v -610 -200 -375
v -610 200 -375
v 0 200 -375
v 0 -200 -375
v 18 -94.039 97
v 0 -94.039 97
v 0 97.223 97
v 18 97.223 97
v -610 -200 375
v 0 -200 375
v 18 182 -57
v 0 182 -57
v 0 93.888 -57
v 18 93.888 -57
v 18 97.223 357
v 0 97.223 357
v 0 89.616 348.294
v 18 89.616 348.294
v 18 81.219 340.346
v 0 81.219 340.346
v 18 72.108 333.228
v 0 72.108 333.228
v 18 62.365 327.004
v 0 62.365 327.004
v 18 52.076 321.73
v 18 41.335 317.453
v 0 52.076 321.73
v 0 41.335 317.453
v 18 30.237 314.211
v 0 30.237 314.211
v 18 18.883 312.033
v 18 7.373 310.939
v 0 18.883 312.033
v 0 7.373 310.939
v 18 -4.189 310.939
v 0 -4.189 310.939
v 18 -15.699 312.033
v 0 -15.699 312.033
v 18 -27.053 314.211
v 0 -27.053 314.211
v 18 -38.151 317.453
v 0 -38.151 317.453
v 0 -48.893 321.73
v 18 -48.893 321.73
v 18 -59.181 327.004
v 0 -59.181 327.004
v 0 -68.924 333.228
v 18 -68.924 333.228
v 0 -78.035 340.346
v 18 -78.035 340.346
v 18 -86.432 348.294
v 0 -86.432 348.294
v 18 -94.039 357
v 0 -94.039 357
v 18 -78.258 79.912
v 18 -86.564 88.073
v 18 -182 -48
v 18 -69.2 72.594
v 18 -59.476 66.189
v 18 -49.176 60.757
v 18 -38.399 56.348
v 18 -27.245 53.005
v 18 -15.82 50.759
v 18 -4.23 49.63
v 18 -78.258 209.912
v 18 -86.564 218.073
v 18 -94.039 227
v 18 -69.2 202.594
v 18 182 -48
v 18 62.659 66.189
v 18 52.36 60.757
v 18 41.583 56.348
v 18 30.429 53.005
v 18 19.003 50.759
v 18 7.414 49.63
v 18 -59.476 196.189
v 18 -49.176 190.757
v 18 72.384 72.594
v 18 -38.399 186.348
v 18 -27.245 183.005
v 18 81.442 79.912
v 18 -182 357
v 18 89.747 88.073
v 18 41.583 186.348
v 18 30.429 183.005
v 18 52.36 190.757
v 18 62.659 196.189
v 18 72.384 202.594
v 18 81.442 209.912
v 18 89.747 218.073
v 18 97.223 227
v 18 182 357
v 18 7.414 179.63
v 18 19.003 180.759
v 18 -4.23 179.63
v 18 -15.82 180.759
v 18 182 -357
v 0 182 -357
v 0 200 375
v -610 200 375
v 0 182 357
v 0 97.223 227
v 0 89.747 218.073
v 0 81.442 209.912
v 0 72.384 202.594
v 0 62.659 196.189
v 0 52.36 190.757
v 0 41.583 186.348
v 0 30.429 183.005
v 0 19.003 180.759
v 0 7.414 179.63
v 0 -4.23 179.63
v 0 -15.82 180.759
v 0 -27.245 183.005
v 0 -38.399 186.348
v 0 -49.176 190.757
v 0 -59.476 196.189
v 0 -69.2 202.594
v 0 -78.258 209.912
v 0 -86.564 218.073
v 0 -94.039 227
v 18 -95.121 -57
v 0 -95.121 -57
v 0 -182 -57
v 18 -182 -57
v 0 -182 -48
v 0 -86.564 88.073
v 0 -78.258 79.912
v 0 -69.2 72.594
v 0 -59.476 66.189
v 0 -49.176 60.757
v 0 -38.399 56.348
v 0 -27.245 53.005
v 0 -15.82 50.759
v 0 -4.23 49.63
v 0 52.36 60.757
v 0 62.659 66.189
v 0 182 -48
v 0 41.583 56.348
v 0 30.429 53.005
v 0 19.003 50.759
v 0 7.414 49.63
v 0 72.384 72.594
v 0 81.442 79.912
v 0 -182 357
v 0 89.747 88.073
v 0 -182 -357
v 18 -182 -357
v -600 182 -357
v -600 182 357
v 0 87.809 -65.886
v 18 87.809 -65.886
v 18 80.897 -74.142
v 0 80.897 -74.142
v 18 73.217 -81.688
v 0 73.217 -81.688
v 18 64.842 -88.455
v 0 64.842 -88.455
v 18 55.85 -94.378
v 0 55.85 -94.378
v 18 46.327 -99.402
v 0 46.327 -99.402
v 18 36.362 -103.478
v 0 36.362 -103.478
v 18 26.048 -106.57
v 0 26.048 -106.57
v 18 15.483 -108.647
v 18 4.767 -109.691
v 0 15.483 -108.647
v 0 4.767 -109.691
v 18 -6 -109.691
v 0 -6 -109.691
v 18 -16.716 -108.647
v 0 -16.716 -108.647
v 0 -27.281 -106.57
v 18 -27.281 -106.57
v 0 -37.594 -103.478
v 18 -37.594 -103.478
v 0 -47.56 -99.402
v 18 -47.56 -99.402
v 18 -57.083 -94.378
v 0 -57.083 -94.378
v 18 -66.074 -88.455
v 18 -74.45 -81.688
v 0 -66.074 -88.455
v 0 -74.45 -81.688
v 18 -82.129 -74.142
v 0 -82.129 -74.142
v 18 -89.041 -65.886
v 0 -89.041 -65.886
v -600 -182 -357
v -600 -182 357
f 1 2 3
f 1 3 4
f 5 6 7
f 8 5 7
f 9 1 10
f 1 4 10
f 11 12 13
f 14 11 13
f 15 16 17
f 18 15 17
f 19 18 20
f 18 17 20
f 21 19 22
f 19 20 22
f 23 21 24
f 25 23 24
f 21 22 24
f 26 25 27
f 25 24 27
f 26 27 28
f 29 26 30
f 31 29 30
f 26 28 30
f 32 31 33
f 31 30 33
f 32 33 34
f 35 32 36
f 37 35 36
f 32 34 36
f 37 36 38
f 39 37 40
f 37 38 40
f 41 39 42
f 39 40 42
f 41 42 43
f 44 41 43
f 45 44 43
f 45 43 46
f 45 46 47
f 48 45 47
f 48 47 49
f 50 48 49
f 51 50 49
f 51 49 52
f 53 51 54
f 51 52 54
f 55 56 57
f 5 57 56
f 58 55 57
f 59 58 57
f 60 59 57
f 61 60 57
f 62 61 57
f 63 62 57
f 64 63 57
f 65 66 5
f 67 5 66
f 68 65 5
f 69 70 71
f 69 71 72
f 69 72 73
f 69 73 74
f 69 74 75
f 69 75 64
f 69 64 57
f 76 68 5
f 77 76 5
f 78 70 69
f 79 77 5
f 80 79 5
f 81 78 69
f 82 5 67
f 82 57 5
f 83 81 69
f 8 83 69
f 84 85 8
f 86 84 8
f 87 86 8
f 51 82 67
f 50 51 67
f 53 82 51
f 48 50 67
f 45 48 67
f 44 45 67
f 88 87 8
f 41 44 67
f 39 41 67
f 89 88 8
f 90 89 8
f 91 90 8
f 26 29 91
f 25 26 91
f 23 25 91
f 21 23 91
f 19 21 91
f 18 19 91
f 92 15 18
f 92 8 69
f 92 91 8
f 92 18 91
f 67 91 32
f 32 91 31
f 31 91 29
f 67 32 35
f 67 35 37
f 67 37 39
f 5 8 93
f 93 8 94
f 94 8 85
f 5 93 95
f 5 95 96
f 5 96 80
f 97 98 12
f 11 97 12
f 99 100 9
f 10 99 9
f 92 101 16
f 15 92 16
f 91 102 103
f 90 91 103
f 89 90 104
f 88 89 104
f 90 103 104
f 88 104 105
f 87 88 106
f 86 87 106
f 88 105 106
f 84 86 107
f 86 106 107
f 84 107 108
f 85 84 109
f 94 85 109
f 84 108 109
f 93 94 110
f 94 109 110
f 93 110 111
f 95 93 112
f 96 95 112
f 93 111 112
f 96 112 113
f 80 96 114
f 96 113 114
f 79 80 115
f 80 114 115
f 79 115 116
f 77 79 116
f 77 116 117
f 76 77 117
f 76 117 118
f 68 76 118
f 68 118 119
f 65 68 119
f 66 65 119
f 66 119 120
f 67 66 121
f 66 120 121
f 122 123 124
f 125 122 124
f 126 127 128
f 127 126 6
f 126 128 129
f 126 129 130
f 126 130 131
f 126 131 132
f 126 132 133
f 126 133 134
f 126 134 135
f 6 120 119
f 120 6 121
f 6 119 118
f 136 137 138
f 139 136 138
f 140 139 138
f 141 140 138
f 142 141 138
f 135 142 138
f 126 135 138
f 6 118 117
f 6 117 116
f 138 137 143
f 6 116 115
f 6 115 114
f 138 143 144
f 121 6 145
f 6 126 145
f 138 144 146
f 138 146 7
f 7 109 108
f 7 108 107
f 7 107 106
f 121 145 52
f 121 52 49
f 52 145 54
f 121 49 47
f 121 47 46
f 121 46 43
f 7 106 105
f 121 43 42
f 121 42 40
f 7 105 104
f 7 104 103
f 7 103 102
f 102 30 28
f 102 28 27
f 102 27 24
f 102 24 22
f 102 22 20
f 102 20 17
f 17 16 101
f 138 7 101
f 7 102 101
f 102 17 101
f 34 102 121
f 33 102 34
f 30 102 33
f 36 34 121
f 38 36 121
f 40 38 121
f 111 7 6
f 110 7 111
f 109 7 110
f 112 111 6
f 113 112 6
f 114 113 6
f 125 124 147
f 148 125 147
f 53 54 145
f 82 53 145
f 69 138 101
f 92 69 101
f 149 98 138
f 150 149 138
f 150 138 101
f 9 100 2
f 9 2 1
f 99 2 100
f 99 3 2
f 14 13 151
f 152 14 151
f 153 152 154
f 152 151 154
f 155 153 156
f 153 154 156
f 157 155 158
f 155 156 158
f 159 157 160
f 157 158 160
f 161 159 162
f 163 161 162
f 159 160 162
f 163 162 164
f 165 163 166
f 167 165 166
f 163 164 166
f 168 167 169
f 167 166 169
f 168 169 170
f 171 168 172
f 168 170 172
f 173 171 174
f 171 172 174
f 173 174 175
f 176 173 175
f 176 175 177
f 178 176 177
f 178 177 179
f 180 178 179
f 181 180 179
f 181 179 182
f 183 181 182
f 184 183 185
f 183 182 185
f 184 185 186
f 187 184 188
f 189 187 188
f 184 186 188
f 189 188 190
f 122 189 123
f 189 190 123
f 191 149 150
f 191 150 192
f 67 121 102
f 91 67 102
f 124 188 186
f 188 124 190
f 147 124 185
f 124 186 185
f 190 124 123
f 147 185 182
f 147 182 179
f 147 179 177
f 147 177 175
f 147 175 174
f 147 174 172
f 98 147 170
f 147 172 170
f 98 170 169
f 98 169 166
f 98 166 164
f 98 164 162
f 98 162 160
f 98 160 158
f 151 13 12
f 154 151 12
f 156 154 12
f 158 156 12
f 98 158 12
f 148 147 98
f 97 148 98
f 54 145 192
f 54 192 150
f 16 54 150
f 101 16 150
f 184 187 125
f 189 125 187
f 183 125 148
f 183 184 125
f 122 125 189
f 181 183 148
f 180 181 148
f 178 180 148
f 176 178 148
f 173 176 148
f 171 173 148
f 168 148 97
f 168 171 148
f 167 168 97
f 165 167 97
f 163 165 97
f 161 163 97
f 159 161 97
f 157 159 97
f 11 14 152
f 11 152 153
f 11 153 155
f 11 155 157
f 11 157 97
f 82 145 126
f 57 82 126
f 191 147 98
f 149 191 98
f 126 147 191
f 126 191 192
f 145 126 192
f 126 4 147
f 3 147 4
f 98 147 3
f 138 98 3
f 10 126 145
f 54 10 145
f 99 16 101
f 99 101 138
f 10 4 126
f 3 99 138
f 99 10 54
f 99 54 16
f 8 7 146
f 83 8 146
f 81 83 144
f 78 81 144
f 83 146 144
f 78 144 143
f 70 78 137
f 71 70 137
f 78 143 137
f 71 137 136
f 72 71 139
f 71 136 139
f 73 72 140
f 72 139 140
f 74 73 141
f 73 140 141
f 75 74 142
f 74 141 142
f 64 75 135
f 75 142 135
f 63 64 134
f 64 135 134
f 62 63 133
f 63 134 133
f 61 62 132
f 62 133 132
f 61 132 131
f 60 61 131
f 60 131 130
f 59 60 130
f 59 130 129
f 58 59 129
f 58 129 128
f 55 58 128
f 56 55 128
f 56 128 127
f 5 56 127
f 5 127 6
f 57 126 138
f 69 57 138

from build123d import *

# Parameters (mm, degrees)
F0_W     = 400
F0_H     = 750
F0_W_2   = 364
F0_H_2   = 714
F1_DEPTH = 600
F2_W     = 400
F2_H     = 750
F3_DEPTH = 10
F6_DEPTH = 18
F7_DEPTH = 18
F8_DEPTH = 18
F9_DEPTH = 18


with BuildPart() as f1:
    # F0 (on Right) → F1 (new body)
    with BuildSketch(Plane.YZ):
        Rectangle(F0_W, F0_H)
        Rectangle(F0_W_2, F0_H_2, mode=Mode.SUBTRACT)
    extrude(amount=-F1_DEPTH)

    # F2 (on face) → F3 (join)
    with BuildSketch(Plane(origin=(-600, 0, 0), x_dir=(0, -1, 0), z_dir=(-1, 0, 0))):
        Rectangle(F2_W, F2_H)
    extrude(amount=F3_DEPTH)



with BuildPart() as f6:
    # F5 (on face) → F6 (new body)
    with BuildSketch(Plane.YZ):
        with BuildLine():
            Line((-94.039477, 97), (-182, 97))
            Line((-182, 97), (-182, -48))
            Line((-182, -48), (182, -48))
            Line((182, -48), (182, 97))
            Line((182, 97), (97.223356, 97))
            ThreePointArc((97.223356, 97), (1.591939, 49.488841), (-94.039477, 97))
        make_face()
    extrude(amount=F6_DEPTH)


with BuildPart() as f1_1:
    add(f1.part)

    add(f6.part)  # F7 merges F6
    # F5 (on face) → F7 (join)
    with BuildSketch(Plane.YZ):
        with BuildLine():
            Line((-94.039477, 227), (-182, 227))
            Line((-182, 227), (-182, 97))
            Line((-182, 97), (-94.039477, 97))
            Line((-94.039477, 97), (97.223356, 97))
            Line((97.223356, 97), (182, 97))
            Line((182, 97), (182, 227))
            Line((182, 227), (97.223356, 227))
            ThreePointArc((97.223356, 227), (1.591939, 179.488841), (-94.039477, 227))
        make_face()
    extrude(amount=F7_DEPTH)

    # F5 (on face) → F8 (join)
    with BuildSketch(Plane.YZ):
        with BuildLine():
            Line((-94.039477, 357), (-182, 357))
            Line((-182, 357), (-182, 227))
            Line((-182, 227), (-94.039477, 227))
            Line((-94.039477, 227), (97.223356, 227))
            Line((97.223356, 227), (182, 227))
            Line((182, 227), (182, 357))
            Line((182, 357), (97.223356, 357))
            ThreePointArc((97.223356, 357), (1.591939, 310.802282), (-94.039477, 357))
        make_face()
    extrude(amount=F8_DEPTH)


with BuildPart() as f9:
    # F4 (on face) → F9 (new body)
    with BuildSketch(Plane.YZ):
        with BuildLine():
            Line((-182, -57), (-182, -357))
            Line((-182, -357), (182, -357))
            Line((182, -357), (182, -57))
            Line((182, -57), (93.888007, -57))
            ThreePointArc((93.888007, -57), (-0.616327, -109.82179), (-95.120661, -57))
            Line((-95.120661, -57), (-182, -57))
        make_face()
    extrude(amount=F9_DEPTH)


solid = Compound([f1_1.part, f9.part])
